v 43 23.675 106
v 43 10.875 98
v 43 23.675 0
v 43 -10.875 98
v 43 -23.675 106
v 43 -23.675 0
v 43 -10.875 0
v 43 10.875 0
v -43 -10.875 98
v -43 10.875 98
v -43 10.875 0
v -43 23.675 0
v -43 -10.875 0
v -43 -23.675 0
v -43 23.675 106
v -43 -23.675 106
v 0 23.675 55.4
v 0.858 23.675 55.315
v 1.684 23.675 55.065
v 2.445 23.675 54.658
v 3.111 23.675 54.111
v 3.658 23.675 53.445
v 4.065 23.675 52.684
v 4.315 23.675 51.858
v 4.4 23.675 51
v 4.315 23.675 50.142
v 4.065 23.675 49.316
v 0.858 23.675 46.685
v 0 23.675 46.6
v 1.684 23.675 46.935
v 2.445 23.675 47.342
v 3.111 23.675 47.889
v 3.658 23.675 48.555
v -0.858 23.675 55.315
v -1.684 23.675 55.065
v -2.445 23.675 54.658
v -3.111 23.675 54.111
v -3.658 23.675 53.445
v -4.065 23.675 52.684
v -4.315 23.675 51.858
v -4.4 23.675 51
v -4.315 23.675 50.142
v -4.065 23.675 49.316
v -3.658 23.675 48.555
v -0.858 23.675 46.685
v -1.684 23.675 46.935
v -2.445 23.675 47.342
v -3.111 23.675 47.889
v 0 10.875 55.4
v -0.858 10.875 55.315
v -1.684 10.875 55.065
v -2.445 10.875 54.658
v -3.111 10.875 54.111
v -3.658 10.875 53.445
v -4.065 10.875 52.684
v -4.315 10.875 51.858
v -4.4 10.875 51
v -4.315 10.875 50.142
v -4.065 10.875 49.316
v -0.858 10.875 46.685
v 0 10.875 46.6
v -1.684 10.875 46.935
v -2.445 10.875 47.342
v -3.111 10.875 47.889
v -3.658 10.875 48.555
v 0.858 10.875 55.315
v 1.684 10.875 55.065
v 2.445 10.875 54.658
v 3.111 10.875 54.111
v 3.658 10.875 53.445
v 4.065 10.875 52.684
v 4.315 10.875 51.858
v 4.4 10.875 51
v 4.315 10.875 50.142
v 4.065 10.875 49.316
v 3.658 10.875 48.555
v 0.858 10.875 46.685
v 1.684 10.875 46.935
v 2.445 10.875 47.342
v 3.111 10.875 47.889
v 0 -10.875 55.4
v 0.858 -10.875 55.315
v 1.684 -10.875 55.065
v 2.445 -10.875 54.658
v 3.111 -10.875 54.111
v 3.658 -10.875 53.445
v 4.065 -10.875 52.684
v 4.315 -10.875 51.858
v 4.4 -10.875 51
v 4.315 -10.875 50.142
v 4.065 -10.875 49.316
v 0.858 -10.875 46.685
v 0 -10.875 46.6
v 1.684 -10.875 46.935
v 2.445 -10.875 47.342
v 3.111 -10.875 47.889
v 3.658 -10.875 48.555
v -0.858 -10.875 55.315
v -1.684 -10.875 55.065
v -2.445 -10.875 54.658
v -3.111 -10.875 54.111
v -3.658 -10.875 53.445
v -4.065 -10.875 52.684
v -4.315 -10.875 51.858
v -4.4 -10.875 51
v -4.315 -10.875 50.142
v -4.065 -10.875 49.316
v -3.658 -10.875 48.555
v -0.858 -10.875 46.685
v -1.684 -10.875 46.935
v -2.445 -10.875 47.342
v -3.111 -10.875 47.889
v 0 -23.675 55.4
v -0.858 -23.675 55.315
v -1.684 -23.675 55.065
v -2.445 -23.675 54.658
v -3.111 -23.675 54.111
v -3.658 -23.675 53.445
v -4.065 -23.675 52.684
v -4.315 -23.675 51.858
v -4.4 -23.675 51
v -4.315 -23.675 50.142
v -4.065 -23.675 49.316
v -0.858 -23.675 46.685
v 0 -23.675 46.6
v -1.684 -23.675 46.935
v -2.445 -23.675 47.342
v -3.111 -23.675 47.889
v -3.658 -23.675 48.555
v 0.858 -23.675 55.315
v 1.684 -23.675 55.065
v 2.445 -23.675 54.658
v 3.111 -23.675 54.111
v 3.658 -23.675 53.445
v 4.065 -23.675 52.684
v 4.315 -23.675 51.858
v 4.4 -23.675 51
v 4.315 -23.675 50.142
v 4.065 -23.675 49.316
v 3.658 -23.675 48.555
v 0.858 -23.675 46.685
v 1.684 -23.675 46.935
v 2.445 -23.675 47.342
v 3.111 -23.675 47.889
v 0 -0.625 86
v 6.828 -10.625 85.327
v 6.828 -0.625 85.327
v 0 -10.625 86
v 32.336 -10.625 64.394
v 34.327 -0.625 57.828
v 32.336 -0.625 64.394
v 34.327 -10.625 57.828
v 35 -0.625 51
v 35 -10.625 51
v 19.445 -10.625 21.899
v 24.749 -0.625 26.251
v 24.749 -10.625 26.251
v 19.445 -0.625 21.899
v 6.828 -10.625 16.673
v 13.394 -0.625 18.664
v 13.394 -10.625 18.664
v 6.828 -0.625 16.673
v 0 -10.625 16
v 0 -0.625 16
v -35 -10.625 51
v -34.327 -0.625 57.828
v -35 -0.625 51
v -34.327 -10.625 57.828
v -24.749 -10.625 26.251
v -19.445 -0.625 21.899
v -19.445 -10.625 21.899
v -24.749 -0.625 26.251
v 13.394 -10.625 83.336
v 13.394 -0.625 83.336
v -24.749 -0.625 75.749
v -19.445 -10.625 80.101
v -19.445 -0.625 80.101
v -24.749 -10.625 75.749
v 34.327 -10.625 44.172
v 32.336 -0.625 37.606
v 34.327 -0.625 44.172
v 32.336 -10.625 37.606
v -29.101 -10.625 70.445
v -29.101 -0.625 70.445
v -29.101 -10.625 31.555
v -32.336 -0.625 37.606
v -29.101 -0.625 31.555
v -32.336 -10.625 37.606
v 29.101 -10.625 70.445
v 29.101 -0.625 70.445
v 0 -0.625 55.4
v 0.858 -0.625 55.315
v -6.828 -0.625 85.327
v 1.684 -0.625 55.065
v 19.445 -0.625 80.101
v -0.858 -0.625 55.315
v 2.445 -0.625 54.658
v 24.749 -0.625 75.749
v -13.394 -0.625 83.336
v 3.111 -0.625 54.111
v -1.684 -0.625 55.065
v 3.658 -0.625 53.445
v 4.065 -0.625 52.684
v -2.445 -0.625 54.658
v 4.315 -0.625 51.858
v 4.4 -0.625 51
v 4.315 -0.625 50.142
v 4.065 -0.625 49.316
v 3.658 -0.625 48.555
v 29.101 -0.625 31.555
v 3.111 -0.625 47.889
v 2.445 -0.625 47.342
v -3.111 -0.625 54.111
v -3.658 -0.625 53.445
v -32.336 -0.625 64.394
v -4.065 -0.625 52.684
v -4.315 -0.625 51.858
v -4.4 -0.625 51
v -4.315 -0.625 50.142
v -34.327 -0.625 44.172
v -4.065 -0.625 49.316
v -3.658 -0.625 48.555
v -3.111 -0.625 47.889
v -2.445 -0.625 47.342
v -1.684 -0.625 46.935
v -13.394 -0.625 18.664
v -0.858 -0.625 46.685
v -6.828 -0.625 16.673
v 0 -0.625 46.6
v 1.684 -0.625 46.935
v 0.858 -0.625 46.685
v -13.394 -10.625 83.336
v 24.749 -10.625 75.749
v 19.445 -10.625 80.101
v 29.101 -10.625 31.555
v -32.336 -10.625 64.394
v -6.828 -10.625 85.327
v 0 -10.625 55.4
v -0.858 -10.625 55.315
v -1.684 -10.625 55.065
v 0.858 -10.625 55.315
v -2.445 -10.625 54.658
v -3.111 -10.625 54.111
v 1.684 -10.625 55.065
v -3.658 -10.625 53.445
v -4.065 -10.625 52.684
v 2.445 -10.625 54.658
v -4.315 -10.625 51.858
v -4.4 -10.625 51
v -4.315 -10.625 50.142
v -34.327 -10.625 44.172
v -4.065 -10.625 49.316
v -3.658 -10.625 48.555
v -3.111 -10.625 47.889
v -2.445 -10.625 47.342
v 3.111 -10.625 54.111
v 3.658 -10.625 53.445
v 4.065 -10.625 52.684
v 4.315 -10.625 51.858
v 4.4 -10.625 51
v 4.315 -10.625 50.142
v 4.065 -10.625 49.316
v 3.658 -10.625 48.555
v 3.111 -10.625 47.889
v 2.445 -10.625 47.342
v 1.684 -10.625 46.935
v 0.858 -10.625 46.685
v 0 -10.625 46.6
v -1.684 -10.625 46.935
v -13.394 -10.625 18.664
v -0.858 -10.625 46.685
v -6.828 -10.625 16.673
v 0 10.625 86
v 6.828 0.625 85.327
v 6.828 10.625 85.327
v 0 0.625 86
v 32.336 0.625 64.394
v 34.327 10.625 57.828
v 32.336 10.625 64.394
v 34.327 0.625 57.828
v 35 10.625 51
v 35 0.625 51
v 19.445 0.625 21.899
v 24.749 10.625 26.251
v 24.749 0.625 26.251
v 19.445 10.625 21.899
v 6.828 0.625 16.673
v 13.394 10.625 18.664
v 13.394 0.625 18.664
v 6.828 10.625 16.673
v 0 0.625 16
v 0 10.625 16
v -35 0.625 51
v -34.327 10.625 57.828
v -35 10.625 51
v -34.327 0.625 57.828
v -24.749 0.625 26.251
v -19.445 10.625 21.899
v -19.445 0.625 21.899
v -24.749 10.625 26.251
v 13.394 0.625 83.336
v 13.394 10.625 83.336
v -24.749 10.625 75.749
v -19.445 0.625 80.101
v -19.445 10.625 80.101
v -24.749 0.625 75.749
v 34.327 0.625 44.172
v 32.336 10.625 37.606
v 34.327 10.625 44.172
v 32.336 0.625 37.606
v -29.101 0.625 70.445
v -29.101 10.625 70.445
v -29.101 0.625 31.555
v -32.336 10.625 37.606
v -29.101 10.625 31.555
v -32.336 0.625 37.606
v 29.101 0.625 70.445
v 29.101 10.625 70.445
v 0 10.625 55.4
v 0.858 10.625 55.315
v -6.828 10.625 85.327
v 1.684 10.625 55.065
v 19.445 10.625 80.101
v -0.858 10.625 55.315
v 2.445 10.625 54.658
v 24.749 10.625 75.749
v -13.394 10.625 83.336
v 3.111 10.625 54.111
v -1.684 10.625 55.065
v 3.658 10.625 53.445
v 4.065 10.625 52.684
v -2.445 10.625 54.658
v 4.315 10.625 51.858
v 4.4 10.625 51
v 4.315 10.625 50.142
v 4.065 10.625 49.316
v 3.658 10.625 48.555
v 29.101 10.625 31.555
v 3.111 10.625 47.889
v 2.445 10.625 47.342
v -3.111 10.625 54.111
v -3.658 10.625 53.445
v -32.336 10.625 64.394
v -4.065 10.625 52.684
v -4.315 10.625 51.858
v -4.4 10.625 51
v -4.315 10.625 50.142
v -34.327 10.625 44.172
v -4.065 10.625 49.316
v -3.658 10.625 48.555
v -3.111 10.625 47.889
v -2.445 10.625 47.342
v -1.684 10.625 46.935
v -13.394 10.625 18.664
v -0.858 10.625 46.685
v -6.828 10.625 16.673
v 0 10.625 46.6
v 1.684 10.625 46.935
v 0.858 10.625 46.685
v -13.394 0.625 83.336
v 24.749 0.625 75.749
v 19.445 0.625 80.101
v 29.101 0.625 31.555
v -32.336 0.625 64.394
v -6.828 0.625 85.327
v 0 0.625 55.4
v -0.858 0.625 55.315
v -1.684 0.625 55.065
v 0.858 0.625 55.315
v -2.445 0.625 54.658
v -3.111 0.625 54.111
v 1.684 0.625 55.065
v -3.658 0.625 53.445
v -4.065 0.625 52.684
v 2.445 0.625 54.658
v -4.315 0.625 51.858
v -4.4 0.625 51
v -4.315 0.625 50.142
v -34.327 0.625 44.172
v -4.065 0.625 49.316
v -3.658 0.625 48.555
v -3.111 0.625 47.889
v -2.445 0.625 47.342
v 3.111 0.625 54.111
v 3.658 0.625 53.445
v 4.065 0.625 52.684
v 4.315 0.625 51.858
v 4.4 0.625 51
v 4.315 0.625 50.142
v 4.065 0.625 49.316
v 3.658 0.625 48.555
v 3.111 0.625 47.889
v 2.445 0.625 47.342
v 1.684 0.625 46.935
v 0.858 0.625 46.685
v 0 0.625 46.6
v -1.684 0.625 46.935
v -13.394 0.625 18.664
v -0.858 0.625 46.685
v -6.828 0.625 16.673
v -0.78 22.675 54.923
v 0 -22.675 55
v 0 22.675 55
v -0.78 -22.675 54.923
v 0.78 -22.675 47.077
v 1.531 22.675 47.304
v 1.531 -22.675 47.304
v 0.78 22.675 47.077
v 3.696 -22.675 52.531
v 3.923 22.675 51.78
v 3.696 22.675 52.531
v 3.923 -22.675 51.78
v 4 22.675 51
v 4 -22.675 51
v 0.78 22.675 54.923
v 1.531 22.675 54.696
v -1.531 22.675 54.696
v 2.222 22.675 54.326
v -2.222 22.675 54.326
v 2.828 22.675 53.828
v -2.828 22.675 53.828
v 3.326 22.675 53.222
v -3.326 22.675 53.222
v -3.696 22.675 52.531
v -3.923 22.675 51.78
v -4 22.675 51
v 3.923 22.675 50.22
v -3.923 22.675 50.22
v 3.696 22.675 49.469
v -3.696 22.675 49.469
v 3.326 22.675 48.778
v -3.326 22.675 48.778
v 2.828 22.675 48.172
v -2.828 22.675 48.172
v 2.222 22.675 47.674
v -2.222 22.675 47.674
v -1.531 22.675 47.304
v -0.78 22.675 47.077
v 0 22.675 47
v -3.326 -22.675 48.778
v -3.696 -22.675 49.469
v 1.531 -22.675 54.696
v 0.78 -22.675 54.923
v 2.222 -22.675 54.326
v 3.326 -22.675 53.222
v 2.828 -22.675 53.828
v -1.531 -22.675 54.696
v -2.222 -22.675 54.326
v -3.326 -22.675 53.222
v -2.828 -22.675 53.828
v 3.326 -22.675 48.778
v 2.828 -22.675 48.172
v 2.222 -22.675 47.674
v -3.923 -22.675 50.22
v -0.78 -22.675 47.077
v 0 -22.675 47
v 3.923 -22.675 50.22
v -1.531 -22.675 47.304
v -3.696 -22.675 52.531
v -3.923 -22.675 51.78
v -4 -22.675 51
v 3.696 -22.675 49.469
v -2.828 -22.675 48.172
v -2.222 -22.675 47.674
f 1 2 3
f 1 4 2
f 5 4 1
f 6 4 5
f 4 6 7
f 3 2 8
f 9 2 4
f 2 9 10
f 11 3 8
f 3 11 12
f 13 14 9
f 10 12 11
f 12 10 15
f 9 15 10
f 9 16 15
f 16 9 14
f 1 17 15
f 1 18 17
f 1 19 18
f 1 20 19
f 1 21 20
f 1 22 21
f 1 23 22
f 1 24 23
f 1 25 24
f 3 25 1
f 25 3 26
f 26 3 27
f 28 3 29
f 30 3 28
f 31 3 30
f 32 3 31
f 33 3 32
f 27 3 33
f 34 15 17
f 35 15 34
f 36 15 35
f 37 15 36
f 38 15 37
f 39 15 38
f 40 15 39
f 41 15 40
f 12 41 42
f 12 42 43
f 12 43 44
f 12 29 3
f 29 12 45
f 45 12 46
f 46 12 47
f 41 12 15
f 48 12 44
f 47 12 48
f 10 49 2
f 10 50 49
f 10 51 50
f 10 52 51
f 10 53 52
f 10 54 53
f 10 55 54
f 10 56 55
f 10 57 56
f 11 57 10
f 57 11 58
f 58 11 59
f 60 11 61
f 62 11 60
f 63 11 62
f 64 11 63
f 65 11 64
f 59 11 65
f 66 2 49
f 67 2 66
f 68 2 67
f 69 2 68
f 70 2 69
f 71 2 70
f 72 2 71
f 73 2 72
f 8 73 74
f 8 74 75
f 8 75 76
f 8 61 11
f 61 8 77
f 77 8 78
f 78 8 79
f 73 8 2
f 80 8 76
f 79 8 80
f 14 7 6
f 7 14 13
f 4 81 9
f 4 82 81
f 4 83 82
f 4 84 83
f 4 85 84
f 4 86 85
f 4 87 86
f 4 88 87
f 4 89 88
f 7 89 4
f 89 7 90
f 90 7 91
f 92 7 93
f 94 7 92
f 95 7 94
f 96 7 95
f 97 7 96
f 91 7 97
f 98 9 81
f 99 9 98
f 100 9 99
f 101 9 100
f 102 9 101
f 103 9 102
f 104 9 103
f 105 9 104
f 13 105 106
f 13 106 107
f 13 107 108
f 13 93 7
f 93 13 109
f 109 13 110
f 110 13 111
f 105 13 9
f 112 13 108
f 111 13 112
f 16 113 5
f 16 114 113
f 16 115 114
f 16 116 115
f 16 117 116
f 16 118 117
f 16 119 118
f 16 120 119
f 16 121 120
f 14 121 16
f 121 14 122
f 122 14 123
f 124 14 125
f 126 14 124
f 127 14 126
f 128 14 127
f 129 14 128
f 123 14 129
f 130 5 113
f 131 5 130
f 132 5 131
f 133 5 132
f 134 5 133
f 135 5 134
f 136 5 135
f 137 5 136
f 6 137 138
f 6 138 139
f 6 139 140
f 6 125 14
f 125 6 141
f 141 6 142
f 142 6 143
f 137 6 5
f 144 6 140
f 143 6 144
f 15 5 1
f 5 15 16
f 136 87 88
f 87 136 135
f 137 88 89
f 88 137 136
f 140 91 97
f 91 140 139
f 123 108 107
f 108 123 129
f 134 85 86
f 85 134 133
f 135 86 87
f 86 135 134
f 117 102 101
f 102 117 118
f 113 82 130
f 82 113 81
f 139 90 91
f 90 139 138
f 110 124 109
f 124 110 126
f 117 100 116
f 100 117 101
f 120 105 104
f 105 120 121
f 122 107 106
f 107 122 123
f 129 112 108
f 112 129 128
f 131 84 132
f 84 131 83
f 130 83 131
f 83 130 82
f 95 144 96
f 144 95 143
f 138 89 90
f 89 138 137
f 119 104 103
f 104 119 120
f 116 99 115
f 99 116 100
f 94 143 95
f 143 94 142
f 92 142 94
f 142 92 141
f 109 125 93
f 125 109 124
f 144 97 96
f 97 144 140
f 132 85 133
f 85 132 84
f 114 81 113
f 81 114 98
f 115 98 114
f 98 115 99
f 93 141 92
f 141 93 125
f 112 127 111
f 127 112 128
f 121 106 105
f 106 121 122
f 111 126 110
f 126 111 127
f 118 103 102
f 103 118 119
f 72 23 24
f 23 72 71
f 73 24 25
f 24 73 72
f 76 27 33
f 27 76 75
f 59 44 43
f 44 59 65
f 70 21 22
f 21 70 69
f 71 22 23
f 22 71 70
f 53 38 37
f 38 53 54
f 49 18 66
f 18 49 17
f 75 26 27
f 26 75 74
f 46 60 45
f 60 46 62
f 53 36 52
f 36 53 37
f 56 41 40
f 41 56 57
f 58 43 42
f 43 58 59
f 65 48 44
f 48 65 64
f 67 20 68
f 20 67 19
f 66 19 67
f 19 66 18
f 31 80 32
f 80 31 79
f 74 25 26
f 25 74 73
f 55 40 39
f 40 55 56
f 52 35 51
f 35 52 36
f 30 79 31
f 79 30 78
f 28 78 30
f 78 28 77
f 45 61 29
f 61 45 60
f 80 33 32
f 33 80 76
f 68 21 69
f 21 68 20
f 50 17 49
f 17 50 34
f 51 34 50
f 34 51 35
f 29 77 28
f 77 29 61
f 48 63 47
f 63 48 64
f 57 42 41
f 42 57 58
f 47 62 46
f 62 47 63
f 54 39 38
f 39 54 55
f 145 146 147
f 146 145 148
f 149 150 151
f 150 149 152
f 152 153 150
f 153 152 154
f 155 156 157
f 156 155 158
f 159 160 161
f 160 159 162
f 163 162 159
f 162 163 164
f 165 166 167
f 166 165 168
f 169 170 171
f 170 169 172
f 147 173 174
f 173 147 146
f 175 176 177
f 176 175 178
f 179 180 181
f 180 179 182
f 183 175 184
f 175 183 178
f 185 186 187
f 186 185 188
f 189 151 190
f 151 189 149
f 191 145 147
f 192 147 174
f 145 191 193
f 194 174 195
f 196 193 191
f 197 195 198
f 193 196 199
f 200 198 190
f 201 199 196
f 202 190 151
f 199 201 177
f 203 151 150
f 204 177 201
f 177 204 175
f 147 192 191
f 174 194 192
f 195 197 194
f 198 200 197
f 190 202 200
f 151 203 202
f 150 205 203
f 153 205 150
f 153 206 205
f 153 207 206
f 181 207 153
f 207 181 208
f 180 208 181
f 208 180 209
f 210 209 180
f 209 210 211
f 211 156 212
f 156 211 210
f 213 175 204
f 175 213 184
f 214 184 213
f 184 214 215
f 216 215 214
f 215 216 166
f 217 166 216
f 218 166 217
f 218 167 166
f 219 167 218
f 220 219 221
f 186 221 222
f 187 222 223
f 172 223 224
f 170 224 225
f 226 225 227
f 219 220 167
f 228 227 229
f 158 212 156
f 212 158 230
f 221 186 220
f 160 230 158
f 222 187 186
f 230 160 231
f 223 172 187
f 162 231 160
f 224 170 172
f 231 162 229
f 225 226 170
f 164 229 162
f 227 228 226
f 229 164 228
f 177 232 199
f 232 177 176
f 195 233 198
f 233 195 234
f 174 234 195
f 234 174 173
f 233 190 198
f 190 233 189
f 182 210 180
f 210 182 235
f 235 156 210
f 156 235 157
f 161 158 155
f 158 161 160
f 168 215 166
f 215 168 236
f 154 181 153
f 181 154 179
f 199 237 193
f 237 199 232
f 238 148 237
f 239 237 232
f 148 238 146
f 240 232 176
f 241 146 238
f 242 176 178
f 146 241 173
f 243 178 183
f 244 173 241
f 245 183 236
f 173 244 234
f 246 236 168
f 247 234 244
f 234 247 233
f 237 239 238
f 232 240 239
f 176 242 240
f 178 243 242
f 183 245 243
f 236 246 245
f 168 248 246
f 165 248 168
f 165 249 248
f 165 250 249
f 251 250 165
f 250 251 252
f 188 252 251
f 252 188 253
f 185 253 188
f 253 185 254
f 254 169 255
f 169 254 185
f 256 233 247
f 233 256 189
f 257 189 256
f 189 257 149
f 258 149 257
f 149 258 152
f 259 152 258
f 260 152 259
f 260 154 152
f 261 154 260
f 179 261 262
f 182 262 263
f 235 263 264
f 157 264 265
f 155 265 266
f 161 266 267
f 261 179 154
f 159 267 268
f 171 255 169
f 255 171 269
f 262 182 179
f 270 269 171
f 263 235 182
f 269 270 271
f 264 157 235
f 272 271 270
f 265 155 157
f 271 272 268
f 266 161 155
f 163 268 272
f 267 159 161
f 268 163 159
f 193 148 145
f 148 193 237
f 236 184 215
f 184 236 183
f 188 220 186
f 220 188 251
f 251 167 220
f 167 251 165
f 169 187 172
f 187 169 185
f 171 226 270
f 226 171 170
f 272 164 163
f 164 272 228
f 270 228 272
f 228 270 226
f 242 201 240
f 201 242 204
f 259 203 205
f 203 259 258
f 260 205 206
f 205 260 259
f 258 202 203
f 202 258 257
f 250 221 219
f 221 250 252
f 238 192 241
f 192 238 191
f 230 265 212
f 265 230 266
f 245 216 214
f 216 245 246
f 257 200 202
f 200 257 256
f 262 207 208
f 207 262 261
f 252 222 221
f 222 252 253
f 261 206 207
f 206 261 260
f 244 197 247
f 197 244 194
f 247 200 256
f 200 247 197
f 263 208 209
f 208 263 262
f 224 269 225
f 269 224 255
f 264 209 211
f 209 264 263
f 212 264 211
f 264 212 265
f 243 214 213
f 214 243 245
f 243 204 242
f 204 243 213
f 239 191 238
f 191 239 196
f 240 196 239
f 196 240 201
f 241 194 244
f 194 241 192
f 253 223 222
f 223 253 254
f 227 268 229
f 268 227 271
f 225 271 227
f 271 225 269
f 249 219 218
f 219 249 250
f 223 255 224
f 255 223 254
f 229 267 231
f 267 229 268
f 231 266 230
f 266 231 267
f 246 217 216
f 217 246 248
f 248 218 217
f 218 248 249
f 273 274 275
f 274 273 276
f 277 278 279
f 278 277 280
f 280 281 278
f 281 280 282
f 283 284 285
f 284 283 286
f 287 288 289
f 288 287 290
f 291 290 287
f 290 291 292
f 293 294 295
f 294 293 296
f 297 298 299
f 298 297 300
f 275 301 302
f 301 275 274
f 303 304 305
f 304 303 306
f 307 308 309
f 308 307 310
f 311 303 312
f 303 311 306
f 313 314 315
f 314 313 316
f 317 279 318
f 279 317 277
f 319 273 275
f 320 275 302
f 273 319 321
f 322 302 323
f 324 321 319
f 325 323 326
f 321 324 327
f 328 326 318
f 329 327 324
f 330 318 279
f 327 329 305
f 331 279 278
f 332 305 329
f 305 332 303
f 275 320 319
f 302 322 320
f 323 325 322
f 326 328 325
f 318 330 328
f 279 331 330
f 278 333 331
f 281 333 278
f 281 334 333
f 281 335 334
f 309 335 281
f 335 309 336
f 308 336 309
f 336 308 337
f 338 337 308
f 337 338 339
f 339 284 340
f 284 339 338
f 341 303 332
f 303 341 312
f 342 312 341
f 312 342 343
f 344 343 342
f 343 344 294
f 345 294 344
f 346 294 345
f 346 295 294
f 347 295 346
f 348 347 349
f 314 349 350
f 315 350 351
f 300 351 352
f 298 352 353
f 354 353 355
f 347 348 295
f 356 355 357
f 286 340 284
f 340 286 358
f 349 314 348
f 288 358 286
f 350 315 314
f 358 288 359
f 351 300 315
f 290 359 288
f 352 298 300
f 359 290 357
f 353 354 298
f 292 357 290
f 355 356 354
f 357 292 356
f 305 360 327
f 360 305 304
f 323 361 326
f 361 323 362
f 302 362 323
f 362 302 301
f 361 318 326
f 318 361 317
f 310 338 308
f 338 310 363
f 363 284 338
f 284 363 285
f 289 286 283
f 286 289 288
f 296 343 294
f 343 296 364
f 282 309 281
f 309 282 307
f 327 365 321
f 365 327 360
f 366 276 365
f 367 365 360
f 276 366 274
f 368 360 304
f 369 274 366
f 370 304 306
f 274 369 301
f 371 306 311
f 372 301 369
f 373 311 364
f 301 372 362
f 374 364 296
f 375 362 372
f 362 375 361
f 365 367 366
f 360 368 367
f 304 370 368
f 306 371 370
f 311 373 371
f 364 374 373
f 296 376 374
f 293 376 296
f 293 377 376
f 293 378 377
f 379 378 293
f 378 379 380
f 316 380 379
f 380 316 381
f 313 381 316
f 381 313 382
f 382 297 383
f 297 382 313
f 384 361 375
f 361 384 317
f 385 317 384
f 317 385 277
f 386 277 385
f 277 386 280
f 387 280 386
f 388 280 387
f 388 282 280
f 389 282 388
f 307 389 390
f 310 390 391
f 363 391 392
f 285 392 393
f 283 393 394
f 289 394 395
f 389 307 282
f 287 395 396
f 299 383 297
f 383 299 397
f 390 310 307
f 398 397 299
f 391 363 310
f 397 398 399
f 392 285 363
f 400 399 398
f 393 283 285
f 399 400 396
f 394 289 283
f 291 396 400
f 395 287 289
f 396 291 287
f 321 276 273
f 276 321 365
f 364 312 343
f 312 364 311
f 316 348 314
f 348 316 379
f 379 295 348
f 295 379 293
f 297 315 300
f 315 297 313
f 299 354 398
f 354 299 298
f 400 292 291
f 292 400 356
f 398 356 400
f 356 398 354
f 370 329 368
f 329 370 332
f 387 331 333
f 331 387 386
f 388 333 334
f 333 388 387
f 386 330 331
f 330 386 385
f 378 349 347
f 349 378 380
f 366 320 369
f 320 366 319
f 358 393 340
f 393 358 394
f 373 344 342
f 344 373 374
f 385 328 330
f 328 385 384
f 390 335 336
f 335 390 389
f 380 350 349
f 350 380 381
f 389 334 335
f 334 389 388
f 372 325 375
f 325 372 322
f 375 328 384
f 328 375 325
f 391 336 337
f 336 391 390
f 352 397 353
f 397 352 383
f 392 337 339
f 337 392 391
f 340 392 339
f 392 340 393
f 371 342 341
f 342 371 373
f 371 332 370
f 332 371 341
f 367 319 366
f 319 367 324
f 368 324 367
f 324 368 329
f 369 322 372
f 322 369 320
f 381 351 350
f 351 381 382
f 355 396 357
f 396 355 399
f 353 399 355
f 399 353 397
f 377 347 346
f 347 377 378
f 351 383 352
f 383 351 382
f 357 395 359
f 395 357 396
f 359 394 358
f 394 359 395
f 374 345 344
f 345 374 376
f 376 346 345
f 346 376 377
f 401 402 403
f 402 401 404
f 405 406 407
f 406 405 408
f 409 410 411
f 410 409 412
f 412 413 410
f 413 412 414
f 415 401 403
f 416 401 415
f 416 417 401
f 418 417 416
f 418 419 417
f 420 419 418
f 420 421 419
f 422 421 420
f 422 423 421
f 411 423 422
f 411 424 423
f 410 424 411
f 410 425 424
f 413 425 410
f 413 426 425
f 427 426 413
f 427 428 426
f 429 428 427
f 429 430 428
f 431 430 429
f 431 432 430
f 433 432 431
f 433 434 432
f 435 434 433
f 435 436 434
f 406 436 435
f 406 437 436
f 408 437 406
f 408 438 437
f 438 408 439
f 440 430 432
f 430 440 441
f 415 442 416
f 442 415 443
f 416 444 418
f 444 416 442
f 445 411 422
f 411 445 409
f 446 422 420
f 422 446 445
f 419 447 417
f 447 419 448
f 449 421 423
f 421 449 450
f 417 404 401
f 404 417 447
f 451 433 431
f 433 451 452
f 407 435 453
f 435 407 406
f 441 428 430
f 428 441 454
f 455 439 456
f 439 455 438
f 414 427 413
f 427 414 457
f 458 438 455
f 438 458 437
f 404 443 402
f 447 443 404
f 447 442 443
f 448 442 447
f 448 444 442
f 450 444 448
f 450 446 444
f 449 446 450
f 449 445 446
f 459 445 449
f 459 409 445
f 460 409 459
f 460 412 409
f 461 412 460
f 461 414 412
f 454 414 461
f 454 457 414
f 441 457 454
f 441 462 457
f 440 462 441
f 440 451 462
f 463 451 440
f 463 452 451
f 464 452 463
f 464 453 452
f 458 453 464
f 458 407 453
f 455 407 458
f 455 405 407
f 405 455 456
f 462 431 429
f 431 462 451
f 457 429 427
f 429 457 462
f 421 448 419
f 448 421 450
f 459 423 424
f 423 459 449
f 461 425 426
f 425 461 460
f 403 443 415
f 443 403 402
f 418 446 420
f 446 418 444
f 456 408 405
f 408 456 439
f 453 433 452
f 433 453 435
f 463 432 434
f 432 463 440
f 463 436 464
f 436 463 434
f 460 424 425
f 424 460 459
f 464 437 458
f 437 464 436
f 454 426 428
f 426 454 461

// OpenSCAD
$fn = 32;

// ------------------------------------------------------------------------
// Trolley wheel set: wheels d70, fork 98 mm tall
// Every part is its own module, assembly() places every instance.
// ------------------------------------------------------------------------

// --- part 1 ---
module trolley_fork() {
  difference() {
    union() {
      translate([-43, 10.875, 0]) cube([86, 12.8, 98]);
      translate([-43, -23.675, 0]) cube([86, 12.8, 98]);
      translate([-43, -23.675, 98]) cube([86, 47.35, 8]);
    }
    translate([0, -17.275, 51]) rotate([90, 0, 0]) cylinder(h = 14.8, d = 8.8, center = true);
    translate([0, 17.275, 51]) rotate([90, 0, 0]) cylinder(h = 14.8, d = 8.8, center = true);
  }
}

// --- part 2 ---
module trolley_wheel() {
  difference() {
      translate([0, 0, 0]) cylinder(h = 10, d = 70);
      translate([0, 0, -1]) cylinder(h = 12, d = 8.8);
    }
}

// --- part 3 ---
module trolley_axle() {
  translate([0, 0, -22.675]) cylinder(h = 45.35, d = 8);
}

// --- assembly ---
module assembly() {
  color([0.80, 0.24, 0.20]) translate([0, 0, 0]) rotate([0, 0, 0]) trolley_fork();
  color([0.20, 0.45, 0.75]) translate([0, -0.625, 51]) rotate([90, 0, 0]) trolley_wheel();
  color([0.25, 0.62, 0.32]) translate([0, 10.625, 51]) rotate([90, 0, 0]) trolley_wheel();
  color([0.92, 0.70, 0.18]) translate([0, 0, 51]) rotate([90, 0, 0]) trolley_axle();
}

assembly();
